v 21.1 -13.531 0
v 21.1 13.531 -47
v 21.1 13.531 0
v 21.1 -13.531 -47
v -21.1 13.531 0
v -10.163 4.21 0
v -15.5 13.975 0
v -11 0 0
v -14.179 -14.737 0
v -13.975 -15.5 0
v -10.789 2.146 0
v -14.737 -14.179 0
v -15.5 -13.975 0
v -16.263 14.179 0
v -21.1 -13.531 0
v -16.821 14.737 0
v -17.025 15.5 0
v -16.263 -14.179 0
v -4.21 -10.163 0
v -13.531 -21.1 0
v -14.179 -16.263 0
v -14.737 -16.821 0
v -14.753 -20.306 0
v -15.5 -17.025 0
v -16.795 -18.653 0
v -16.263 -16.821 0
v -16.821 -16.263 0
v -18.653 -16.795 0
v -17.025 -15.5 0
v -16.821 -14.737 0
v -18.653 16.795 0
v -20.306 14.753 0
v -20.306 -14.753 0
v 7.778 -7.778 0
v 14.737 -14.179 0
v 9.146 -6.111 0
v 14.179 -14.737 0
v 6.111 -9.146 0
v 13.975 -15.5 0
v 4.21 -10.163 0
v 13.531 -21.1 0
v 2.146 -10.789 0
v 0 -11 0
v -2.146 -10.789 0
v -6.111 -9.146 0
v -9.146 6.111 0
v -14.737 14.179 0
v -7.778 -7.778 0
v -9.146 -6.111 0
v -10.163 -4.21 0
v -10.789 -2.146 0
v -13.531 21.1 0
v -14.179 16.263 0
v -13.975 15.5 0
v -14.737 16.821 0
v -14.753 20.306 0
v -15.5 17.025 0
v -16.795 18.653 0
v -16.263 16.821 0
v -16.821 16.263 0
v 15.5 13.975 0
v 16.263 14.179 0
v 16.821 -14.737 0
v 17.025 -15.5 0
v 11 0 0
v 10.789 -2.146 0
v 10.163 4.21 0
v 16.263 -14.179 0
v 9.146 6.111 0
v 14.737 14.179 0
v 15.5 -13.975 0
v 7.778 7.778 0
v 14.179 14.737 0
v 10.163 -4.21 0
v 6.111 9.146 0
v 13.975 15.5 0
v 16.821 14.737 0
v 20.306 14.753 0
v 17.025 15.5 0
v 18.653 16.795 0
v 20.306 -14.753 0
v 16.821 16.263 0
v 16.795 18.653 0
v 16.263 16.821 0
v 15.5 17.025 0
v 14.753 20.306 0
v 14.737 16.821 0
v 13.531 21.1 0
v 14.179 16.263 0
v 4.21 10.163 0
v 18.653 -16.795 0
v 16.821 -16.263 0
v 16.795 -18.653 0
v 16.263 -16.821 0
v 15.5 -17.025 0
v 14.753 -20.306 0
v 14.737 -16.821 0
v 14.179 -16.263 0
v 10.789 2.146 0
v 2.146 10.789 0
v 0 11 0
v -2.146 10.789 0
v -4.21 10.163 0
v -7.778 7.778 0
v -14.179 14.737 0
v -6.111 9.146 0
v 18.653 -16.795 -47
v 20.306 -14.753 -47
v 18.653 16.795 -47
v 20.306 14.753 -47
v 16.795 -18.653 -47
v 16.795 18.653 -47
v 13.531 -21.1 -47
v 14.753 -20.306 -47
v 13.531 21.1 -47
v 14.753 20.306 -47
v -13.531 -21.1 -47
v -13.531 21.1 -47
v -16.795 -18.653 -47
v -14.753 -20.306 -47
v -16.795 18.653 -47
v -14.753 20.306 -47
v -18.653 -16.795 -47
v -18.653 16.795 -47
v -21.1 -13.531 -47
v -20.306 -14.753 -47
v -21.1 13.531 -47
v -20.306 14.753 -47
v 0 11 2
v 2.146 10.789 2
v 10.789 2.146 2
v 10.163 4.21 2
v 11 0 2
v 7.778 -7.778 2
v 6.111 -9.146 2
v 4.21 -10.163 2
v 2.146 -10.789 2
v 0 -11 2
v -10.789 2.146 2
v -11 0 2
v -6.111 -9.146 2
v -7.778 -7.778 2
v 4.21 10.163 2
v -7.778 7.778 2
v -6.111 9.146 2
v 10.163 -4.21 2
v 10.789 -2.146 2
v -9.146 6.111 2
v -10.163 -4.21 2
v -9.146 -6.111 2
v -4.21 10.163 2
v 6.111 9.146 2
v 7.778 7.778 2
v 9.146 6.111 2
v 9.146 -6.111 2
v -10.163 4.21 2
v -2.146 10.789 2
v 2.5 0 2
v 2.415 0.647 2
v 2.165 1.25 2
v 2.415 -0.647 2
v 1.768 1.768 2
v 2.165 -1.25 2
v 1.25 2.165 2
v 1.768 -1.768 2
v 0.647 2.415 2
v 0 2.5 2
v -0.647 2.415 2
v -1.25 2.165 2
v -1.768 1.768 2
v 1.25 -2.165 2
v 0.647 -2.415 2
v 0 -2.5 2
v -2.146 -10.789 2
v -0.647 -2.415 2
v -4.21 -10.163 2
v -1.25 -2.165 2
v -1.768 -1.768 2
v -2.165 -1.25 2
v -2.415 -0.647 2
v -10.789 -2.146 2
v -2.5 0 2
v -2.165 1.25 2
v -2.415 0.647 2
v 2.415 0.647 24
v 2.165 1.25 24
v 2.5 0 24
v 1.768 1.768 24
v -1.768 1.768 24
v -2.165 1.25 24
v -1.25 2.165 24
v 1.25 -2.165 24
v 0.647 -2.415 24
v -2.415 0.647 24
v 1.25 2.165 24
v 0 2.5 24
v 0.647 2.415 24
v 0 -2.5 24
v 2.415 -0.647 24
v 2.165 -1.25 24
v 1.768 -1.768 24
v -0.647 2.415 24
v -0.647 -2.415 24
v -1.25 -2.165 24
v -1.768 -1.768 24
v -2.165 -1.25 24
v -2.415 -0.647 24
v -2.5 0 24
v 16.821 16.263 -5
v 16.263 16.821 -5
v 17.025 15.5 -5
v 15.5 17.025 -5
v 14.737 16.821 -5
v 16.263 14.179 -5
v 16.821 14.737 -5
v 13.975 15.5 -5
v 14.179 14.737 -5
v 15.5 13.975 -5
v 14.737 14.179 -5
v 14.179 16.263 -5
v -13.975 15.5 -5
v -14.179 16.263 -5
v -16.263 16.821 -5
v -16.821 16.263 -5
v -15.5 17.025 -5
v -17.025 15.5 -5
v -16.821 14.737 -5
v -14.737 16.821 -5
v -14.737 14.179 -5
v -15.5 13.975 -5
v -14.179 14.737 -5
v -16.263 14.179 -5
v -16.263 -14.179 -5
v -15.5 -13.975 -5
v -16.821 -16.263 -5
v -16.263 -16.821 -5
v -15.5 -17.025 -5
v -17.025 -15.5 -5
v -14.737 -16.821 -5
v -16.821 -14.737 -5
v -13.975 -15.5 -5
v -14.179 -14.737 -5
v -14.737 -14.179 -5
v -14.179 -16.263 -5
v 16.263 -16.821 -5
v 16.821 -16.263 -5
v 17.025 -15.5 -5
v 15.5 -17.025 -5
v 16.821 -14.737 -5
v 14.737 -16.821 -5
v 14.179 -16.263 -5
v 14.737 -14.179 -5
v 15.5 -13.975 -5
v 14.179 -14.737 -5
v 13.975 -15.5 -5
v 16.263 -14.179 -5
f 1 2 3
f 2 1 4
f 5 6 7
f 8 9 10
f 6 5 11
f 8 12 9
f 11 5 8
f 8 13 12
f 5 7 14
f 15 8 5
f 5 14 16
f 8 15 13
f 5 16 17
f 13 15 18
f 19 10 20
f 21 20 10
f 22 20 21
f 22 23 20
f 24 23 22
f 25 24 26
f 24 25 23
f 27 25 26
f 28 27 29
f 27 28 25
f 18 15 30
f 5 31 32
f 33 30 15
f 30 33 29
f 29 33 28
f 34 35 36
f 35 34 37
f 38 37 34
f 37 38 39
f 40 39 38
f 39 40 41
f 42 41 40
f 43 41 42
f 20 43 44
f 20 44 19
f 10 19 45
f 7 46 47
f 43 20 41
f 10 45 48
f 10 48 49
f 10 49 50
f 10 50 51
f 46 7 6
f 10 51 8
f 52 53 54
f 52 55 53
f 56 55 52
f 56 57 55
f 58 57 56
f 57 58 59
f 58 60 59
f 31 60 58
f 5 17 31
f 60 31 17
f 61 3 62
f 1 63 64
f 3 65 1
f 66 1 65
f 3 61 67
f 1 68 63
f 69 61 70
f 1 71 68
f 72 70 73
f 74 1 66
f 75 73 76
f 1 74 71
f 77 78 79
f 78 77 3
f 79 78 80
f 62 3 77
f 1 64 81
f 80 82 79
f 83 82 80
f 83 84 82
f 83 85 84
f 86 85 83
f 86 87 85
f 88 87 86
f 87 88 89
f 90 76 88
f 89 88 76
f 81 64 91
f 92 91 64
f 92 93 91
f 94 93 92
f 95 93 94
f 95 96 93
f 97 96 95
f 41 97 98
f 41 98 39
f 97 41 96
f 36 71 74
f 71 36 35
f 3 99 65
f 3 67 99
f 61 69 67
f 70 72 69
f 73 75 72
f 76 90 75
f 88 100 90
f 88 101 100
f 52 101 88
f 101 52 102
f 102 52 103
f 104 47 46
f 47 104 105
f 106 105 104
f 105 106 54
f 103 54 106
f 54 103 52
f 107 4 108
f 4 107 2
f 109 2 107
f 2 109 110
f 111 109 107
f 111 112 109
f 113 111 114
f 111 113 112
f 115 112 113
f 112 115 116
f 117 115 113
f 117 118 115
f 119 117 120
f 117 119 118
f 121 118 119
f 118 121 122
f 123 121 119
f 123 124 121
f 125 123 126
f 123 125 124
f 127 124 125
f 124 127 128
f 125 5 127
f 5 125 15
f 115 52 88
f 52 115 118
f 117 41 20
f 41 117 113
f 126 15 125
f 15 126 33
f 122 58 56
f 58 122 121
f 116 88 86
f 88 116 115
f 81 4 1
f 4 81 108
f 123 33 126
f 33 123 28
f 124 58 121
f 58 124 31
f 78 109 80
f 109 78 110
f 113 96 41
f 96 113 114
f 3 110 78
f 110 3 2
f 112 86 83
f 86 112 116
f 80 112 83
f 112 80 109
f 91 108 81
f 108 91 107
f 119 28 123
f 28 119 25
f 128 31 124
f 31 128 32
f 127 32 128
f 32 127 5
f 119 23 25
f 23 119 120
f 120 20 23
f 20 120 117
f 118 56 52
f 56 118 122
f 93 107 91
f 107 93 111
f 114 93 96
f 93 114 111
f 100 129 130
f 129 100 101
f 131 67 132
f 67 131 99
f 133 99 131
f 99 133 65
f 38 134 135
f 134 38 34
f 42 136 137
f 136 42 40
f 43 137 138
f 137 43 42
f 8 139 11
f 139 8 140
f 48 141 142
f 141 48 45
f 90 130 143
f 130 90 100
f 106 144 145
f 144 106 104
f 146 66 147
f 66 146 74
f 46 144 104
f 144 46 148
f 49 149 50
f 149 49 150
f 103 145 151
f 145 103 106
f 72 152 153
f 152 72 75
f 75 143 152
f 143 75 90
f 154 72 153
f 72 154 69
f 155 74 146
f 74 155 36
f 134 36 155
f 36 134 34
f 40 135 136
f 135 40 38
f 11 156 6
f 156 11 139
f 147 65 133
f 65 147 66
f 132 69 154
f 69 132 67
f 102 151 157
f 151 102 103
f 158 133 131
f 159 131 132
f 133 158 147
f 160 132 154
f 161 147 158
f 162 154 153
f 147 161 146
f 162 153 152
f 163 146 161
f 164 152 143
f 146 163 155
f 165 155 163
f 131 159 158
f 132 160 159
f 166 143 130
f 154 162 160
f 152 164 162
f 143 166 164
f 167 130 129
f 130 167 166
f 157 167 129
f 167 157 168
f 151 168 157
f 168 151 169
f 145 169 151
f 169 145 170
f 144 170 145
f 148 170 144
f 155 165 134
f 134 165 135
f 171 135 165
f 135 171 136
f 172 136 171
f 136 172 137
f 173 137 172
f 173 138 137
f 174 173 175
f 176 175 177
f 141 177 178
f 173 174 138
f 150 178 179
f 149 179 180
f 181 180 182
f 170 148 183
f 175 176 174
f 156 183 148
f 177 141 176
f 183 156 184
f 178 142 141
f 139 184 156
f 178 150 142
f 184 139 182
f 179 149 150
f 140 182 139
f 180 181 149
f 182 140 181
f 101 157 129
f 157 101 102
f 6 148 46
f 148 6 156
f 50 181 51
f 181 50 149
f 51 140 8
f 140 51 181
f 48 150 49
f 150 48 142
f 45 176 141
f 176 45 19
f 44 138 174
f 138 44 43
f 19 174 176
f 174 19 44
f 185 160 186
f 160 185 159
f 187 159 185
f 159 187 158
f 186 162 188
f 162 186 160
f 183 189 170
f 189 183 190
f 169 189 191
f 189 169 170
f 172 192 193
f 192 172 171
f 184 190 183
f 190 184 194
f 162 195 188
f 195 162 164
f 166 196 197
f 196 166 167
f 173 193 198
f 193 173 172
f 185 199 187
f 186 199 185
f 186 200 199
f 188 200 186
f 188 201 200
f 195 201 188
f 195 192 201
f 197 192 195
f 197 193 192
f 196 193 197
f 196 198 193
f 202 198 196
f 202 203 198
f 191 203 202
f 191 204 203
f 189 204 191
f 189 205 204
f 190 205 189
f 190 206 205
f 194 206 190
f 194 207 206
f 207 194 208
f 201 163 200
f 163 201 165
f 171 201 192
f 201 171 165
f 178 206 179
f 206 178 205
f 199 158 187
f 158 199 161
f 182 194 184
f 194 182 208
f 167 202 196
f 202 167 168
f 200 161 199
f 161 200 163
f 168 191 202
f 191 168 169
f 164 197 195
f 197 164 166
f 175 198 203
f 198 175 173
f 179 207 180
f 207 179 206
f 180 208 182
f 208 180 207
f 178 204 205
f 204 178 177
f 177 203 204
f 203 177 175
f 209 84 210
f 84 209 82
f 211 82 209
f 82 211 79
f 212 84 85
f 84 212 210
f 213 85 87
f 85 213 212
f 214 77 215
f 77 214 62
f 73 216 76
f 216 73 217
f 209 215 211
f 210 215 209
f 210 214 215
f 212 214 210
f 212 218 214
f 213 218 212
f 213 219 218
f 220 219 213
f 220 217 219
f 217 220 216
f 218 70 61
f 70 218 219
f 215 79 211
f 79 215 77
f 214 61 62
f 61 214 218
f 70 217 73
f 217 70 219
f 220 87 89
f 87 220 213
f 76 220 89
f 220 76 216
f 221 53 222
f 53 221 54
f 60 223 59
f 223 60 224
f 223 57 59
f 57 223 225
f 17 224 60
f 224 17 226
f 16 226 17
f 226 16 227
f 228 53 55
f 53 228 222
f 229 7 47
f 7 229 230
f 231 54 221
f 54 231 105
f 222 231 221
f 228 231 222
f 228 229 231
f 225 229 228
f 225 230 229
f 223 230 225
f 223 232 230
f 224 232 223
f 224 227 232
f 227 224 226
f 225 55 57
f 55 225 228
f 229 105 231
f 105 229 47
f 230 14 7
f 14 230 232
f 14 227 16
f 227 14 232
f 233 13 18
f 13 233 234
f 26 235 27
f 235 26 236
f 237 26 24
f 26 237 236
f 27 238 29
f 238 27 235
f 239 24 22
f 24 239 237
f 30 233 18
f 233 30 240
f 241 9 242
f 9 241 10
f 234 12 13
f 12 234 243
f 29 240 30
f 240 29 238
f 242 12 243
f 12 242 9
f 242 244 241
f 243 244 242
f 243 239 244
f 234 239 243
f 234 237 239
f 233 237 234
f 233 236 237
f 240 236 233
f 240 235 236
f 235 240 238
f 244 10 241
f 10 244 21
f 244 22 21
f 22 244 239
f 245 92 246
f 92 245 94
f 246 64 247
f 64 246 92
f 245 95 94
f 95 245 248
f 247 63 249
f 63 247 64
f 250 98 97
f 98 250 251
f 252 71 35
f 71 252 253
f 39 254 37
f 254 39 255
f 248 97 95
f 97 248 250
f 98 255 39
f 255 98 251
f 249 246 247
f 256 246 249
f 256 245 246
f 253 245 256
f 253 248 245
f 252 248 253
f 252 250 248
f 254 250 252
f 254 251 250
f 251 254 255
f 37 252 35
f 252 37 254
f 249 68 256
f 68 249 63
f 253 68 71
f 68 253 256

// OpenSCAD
// file: configuration.scad
// Increase this if your slicer or printer make holes too tight.
extra_radius = 0.1;

// OD = outside diameter, corner to corner.
m3_nut_od = 6.1;
m3_nut_radius = m3_nut_od/2 + 0.2 + extra_radius;
m3_washer_radius = 3.5 + extra_radius;

// Major diameter of metric 3mm thread.
m3_major = 2.85;
m3_radius = m3_major/2 + extra_radius;
m3_wide_radius = m3_major/2 + extra_radius + 0.2;

// NEMA17 stepper motors.
motor_shaft_diameter = 5;
motor_shaft_radius = motor_shaft_diameter/2 + extra_radius;

// Frame brackets. M3x8mm screws work best with 3.6 mm brackets.
thickness = 3.6;

// OpenBeam or Misumi. Currently only 15x15 mm, but there is a plan
// to make models more parametric and allow 20x20 mm in the future.
extrusion = 15;

// Placement for the NEMA17 stepper motors.
motor_offset = 44;
motor_length = 47;
// main file
include <configuration.scad>;

module nema17() {
  // NEMA 17 stepper motor.
  difference() {
    union() {
      translate([0, 0, -motor_length/2]) intersection() {
        cube([42.2, 42.2, motor_length], center=true);
        cylinder(r=25.1, h=motor_length+1, center=true, $fn=60);
      }
      cylinder(r=11, h=4, center=true, $fn=32);
      cylinder(r=2.5, h=48, center=true, $fn=24);
    }
    for (a = [0:90:359]) {
      rotate([0, 0, a]) translate([15.5, 15.5, 0])
        cylinder(r=m3_radius, h=10, center=true, $fn=12);
    }
  }
}

nema17();
